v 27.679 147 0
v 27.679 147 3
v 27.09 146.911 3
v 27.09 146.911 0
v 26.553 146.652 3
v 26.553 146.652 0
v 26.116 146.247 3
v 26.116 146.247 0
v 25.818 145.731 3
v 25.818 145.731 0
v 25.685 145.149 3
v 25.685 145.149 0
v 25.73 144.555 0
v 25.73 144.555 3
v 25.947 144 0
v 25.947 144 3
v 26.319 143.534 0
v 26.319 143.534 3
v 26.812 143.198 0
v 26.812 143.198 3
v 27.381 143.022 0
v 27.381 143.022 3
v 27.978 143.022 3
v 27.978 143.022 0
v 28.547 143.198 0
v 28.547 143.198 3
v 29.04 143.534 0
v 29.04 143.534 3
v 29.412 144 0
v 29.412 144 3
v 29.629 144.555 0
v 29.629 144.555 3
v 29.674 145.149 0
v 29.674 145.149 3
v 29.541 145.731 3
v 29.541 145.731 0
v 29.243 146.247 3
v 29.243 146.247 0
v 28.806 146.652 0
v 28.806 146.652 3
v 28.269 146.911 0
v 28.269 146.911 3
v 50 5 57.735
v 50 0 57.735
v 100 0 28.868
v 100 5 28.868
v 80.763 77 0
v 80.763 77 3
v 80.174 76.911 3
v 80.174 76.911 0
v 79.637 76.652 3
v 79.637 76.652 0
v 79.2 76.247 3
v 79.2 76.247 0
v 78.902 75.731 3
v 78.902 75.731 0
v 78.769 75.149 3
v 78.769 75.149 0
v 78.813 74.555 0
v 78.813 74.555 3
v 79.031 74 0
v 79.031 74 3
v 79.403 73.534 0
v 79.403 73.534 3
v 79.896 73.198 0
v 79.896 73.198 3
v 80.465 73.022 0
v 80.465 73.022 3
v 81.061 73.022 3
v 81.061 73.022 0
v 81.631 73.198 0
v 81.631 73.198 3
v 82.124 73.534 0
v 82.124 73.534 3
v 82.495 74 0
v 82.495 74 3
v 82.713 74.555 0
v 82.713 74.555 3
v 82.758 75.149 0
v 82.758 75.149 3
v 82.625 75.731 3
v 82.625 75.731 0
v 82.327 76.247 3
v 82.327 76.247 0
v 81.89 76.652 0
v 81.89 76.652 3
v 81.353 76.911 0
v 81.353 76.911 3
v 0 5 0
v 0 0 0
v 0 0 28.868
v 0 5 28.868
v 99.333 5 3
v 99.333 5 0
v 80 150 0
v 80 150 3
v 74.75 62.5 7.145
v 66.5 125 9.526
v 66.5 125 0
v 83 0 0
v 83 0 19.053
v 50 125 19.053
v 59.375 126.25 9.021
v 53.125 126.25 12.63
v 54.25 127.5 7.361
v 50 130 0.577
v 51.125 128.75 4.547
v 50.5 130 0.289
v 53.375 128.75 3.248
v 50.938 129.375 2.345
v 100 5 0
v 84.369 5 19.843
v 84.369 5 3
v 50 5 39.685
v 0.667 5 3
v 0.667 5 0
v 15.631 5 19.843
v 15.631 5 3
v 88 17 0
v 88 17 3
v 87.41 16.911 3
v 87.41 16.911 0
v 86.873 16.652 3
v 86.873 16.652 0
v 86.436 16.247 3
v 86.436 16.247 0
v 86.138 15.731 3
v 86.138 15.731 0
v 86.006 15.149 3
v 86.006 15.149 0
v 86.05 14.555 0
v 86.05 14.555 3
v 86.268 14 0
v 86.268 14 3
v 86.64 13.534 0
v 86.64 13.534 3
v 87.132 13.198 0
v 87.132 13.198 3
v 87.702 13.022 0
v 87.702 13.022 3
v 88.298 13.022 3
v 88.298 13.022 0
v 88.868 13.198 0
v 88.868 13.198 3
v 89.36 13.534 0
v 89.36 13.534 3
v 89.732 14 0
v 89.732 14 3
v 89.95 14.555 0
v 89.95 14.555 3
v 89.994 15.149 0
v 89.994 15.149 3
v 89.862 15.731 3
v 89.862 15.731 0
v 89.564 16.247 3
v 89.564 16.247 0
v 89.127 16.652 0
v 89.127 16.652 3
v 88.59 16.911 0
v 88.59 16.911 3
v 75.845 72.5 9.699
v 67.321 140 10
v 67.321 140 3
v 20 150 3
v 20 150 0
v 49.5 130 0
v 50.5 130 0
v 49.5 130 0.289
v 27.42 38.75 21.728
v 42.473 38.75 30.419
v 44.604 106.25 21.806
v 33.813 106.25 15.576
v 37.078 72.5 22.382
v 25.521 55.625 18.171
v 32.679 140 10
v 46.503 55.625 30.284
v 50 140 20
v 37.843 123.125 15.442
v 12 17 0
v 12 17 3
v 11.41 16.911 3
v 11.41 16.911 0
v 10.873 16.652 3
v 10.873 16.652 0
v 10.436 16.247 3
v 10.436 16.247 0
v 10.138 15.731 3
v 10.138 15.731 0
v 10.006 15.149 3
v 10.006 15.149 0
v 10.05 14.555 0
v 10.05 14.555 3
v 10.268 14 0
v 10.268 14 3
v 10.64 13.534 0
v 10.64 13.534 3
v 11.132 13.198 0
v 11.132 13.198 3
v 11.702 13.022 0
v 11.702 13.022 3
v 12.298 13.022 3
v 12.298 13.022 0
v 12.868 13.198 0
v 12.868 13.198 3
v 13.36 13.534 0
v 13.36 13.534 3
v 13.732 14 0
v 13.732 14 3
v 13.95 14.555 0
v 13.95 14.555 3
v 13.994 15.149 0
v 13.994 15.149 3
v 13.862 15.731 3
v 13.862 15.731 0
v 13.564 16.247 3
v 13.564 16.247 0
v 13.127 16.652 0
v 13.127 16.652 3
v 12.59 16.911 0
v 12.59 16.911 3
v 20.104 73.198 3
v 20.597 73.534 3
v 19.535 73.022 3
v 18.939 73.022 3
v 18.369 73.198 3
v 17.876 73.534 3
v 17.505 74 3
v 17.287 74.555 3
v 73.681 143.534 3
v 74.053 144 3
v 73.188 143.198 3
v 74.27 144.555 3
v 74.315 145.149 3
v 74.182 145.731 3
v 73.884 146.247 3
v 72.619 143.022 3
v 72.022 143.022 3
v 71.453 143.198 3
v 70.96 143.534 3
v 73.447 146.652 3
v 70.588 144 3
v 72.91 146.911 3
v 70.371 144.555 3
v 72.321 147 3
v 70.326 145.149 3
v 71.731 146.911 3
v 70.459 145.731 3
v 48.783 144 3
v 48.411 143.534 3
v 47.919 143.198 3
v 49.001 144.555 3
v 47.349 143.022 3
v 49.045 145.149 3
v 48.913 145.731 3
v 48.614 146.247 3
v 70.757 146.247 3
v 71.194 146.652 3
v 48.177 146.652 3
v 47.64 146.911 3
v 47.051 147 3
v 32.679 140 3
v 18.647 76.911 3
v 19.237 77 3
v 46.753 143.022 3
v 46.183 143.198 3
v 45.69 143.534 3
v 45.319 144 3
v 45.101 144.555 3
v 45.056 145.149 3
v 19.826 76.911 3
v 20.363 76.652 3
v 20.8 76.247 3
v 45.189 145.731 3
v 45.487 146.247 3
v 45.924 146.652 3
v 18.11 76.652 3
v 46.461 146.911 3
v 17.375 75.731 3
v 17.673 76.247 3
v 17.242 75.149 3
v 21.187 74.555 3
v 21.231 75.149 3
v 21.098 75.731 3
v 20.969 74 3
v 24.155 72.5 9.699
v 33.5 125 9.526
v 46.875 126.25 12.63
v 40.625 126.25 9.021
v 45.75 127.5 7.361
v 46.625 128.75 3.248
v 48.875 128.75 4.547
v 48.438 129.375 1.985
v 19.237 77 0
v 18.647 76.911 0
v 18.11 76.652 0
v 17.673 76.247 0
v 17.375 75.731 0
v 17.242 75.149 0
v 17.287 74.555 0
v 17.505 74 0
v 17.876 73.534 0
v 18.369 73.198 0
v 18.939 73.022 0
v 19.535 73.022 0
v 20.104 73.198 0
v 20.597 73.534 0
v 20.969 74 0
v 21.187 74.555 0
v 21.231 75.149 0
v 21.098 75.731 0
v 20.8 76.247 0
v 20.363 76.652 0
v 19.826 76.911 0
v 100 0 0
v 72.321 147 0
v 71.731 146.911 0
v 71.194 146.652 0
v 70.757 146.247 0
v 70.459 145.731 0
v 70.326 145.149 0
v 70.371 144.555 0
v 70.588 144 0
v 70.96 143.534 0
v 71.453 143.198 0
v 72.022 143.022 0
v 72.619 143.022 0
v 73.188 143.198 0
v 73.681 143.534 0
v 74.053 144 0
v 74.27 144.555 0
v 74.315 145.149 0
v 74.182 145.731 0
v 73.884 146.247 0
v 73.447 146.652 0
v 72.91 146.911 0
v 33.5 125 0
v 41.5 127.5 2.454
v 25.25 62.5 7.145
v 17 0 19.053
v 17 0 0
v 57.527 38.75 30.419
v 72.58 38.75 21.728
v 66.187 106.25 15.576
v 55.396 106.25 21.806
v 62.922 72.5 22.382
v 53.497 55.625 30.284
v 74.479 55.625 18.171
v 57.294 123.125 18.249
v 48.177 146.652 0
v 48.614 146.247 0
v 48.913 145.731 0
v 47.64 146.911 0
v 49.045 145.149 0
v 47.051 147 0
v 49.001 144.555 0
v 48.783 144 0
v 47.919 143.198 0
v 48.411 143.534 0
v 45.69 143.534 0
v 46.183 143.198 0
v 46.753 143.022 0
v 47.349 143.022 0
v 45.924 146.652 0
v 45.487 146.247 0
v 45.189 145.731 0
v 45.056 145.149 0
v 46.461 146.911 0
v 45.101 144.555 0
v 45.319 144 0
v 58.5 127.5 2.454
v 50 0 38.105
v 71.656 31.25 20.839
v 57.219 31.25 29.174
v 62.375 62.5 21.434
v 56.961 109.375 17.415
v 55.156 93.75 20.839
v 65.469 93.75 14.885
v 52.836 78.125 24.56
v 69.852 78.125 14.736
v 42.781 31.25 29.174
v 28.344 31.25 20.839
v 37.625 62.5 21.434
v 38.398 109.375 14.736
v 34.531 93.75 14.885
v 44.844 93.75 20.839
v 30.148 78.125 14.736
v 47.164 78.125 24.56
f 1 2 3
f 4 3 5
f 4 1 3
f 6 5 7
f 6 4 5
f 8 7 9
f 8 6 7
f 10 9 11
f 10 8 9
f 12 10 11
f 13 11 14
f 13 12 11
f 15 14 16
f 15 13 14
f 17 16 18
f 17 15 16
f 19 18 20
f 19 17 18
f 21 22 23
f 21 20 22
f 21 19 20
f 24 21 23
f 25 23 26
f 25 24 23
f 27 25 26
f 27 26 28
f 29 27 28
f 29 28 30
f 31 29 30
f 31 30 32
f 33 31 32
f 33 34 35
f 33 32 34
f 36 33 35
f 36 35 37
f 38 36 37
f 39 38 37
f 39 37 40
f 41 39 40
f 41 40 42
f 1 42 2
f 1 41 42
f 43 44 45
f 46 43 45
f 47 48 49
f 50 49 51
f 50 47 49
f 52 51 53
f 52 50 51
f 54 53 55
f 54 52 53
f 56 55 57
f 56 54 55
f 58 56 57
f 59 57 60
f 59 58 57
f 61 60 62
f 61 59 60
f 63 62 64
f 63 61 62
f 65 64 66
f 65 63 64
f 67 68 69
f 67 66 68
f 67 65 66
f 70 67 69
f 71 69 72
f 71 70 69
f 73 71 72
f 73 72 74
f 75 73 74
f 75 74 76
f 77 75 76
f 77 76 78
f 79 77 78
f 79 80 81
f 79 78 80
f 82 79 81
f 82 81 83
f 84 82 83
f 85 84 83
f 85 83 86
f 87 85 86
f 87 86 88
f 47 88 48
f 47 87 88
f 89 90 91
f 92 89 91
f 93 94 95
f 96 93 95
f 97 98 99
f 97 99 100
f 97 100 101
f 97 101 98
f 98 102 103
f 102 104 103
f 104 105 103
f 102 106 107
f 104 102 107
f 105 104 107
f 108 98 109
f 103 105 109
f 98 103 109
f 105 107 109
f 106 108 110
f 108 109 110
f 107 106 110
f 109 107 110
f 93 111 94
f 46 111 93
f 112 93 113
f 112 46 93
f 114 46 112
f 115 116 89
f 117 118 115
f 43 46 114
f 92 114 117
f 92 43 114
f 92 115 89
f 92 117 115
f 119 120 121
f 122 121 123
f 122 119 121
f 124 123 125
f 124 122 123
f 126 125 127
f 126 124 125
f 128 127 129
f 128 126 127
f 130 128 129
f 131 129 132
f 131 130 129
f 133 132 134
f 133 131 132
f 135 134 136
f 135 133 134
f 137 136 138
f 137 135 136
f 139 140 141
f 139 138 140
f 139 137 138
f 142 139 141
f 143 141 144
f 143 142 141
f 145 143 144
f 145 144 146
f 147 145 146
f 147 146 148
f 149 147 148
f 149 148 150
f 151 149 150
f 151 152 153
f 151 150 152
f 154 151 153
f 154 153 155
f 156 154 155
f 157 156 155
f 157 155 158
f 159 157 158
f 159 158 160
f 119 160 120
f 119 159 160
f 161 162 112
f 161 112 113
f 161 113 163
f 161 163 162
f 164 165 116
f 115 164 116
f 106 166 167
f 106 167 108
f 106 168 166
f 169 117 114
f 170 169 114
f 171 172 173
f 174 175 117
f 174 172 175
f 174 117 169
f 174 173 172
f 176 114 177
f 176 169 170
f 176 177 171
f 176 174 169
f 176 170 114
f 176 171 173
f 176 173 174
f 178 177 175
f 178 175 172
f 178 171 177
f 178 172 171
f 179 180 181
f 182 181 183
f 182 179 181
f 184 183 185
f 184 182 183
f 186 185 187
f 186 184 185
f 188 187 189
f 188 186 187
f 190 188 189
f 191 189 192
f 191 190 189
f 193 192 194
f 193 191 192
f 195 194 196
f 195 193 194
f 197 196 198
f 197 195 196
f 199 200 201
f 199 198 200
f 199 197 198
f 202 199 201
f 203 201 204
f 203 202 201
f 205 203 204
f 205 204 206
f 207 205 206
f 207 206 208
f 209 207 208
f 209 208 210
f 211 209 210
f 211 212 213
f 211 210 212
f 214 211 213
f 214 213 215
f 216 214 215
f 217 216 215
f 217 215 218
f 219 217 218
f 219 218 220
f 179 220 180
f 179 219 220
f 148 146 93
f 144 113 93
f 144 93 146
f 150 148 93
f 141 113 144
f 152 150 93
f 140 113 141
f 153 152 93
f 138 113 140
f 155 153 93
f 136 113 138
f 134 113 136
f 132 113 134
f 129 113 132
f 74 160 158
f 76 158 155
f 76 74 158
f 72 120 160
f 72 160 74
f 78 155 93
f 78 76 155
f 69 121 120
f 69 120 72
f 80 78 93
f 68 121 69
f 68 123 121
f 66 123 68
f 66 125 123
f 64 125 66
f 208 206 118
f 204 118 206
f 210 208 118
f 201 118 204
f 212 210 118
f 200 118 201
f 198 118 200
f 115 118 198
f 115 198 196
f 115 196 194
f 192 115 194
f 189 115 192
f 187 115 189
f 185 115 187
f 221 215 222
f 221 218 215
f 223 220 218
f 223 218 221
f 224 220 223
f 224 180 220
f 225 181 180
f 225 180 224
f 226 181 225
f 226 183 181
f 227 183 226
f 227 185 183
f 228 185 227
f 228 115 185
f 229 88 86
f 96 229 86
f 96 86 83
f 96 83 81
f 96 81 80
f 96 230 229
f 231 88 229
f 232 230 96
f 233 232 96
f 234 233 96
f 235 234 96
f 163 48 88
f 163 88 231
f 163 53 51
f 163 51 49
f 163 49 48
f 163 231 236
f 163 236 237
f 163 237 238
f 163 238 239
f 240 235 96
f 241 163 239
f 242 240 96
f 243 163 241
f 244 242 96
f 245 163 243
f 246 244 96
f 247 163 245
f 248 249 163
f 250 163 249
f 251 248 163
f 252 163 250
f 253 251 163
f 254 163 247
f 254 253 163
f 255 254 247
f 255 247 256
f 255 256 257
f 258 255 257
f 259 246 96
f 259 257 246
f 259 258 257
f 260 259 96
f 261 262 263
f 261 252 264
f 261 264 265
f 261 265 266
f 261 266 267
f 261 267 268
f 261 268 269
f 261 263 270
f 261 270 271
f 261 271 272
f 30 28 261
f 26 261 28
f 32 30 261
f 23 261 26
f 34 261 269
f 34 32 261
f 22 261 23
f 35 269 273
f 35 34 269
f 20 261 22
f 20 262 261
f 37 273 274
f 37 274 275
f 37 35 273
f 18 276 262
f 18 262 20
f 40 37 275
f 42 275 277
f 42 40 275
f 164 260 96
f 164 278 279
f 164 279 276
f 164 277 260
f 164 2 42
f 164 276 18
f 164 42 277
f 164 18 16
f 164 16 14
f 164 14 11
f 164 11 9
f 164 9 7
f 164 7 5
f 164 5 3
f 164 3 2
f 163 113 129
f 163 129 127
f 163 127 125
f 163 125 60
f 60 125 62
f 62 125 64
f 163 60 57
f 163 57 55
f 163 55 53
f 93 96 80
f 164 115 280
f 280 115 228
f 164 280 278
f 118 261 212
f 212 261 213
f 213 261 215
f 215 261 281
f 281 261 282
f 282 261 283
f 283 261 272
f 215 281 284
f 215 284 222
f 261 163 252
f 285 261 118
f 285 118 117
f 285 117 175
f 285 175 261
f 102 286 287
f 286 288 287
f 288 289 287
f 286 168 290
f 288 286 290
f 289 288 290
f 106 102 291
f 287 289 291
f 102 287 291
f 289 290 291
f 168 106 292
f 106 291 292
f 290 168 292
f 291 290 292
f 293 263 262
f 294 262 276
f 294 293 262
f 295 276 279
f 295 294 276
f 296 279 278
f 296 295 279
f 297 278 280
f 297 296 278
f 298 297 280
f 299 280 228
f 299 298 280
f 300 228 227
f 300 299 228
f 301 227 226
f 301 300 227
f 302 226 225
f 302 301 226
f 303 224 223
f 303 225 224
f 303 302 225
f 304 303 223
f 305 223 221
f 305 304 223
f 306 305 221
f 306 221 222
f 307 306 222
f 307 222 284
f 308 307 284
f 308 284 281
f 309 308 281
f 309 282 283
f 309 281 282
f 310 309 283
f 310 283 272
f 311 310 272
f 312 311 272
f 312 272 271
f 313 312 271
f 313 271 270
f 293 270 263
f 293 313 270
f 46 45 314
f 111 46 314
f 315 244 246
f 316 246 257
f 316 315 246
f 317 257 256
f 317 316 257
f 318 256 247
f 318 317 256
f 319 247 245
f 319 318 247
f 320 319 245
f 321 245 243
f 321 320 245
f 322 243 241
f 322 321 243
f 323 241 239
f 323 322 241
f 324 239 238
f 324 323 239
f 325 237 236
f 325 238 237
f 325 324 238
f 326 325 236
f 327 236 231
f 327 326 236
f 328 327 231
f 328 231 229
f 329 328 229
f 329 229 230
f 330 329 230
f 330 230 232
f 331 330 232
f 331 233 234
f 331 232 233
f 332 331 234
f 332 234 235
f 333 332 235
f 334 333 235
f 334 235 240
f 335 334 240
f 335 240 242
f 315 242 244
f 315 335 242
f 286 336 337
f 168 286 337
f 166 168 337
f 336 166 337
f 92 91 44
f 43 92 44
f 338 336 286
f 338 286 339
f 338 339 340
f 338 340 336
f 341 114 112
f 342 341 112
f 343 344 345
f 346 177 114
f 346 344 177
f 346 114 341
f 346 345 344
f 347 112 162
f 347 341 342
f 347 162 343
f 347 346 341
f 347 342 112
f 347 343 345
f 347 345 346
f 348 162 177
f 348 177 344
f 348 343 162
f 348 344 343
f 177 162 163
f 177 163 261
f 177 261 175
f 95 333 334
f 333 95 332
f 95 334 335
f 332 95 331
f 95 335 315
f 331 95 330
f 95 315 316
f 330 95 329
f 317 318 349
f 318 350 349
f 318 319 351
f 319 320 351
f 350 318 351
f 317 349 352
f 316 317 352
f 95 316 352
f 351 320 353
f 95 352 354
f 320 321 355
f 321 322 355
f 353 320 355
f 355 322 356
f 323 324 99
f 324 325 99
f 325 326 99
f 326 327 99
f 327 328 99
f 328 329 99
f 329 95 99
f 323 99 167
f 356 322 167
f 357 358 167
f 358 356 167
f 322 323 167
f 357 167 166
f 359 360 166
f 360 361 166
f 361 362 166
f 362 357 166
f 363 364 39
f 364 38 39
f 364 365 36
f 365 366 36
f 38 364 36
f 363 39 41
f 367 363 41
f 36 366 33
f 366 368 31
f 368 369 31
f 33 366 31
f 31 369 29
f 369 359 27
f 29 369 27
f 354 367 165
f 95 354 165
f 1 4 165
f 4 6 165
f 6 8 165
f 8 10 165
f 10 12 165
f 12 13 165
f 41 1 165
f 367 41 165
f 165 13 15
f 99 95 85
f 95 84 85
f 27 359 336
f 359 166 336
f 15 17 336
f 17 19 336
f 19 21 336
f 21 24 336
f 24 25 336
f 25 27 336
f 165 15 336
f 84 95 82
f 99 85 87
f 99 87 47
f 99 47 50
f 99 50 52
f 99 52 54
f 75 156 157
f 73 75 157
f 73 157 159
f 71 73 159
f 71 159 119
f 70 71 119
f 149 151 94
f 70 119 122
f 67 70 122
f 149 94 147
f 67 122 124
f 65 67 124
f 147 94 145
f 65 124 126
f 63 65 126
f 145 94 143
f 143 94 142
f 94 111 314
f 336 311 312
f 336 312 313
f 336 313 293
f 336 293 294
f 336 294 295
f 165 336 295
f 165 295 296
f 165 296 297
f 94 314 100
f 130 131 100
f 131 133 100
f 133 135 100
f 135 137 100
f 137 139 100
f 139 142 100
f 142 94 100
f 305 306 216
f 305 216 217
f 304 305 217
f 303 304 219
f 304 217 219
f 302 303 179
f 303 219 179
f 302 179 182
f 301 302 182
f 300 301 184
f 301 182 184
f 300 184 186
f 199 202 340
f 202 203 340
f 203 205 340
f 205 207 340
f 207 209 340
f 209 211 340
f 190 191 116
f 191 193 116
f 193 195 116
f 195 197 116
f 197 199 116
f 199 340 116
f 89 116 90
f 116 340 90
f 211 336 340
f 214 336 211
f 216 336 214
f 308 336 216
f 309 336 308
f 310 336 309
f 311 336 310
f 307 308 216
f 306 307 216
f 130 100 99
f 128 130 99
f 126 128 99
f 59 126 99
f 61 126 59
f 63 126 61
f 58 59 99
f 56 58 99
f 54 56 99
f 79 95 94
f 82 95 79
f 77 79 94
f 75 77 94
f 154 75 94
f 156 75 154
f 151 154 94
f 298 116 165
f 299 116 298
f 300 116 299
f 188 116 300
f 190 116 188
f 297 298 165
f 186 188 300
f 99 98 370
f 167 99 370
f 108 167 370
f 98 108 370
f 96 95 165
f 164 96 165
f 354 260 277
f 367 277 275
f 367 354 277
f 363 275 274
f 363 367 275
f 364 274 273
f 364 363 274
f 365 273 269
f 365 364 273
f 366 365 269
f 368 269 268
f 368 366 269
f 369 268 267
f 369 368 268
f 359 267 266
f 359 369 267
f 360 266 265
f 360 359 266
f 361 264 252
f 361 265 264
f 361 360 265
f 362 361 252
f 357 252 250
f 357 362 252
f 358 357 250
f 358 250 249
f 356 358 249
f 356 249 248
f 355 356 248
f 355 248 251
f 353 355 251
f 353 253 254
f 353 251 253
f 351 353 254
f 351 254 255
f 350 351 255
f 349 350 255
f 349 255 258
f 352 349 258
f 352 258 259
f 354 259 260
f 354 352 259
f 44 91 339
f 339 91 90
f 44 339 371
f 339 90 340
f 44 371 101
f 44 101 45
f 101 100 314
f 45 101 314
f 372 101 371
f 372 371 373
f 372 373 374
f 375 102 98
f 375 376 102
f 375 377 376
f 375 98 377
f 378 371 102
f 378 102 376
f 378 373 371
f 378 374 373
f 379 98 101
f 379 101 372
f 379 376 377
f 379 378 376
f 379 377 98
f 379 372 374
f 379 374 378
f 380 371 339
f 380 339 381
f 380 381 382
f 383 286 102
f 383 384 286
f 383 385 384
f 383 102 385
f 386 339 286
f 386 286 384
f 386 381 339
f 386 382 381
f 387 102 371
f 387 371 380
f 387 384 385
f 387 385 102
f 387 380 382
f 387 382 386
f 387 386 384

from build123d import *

# Parameters (mm, degrees)
EXTRUDE002_DEPTH = 5
FACE007_R        = 2
EXTRUDE001_DEPTH = 10
EXTRUDE_DEPTH    = 3


with BuildPart() as extrude002:
    # Sketch008 (on Face18 of Cut001) → Extrude002 (new body)
    with BuildSketch(Plane.XZ):
        Polygon((0, 0), (0, 28.867513), (50, 57.735027), (100, 28.867513), (100, 0), (83, 0), (83, 19.052559), (50, 38.105118), (17, 19.052559), (17, 0), align=None)
    extrude(amount=-EXTRUDE002_DEPTH)


with BuildPart() as extrude001:
    # Face007 → Extrude001 (new body)
    with BuildSketch(Plane(origin=(88, 15, 0), x_dir=(0, 1, 0), z_dir=(0, 0, 1))):
        Circle(FACE007_R)
        with Locations((0, 76)):
            Circle(FACE007_R)
        with Locations((60, 68.763311)):
            Circle(FACE007_R)
        with Locations((60, 7.236689)):
            Circle(FACE007_R)
        with Locations((130, 15.679492)):
            Circle(FACE007_R)
        with Locations((130, 40.949188)):
            Circle(FACE007_R)
        with Locations((130, 60.320508)):
            Circle(FACE007_R)
    extrude(amount=EXTRUDE001_DEPTH)


with BuildPart() as loft002:
    # Face006 → Loft002 section 0
    with BuildSketch(Plane(origin=(50, 125, 7.409328), x_dir=(1, 0, 0), z_dir=(0, 1, 0))):
        Polygon((-16.5, 7.409328), (-16.5, -2.116951), (0, -11.64323), (16.5, -2.116951), (16.5, 7.409328), align=None)
    # Face005 → Loft002 section 1
    with BuildSketch(Plane(origin=(50, 130, 0.224525), x_dir=(1, 0, 0), z_dir=(0, 1, 0))):
        Polygon((-0.5, 0.224525), (-0.5, -0.06415), (0, -0.352825), (0.5, -0.06415), (0.5, 0.224525), align=None)
    loft()


with BuildPart() as fusion001:
    # Face003 → Loft001 section 0
    with BuildSketch(Plane(origin=(50, 125, 7.409328), x_dir=(1, 0, 0), z_dir=(0, 1, 0))):
        Polygon((-16.5, 7.409328), (-16.5, -2.116951), (0, -11.64323), (16.5, -2.116951), (16.5, 7.409328), align=None)
    # Face004 → Loft001 section 1
    with BuildSketch(Plane(origin=(50, 0, 14.818657), x_dir=(1, 0, 0), z_dir=(0, 1, 0))):
        Polygon((-33, 14.818657), (-33, -4.233902), (0, -23.286461), (33, -4.233902), (33, 14.818657), align=None)
    loft()

    # Fusion001: union Loft002
    add(loft002.part)


with BuildPart() as loft_body:
    # Face001 → Loft section 0
    with BuildSketch(Plane(origin=(50, 0, 15.716757), x_dir=(1, 0, 0), z_dir=(0, 1, 0))):
        Polygon((35, 15.716757), (-35, 15.716757), (-35, -4.490502), (0, -24.697762), (35, -4.490502), align=None)
    # Face002 → Loft section 1
    with BuildSketch(Plane(origin=(50, 140, 7.777778), x_dir=(1, 0, 0), z_dir=(0, 1, 0))):
        Polygon((-17.320508, 7.777778), (-17.320508, -2.222222), (0, -12.222222), (17.320508, -2.222222), (17.320508, 7.777778), align=None)
    loft()


with BuildPart() as fusion002:
    # Face → Extrude (new body)
    with BuildSketch(Plane(origin=(50, 68.75, 0), x_dir=(0, 1, 0), z_dir=(0, 0, 1))):
        Polygon((-68.75, 50), (-68.75, -50), (81.25, -30), (81.25, 30), align=None)
    extrude(amount=EXTRUDE_DEPTH)

    # Fusion: union Loft body
    add(loft_body.part)

    # Cut: cut Fusion001
    add(fusion001.part, mode=Mode.SUBTRACT)

    # Cut001: cut Extrude001
    add(extrude001.part, mode=Mode.SUBTRACT)

    # Fusion002: union Extrude002
    add(extrude002.part)


solid = fusion002.part
